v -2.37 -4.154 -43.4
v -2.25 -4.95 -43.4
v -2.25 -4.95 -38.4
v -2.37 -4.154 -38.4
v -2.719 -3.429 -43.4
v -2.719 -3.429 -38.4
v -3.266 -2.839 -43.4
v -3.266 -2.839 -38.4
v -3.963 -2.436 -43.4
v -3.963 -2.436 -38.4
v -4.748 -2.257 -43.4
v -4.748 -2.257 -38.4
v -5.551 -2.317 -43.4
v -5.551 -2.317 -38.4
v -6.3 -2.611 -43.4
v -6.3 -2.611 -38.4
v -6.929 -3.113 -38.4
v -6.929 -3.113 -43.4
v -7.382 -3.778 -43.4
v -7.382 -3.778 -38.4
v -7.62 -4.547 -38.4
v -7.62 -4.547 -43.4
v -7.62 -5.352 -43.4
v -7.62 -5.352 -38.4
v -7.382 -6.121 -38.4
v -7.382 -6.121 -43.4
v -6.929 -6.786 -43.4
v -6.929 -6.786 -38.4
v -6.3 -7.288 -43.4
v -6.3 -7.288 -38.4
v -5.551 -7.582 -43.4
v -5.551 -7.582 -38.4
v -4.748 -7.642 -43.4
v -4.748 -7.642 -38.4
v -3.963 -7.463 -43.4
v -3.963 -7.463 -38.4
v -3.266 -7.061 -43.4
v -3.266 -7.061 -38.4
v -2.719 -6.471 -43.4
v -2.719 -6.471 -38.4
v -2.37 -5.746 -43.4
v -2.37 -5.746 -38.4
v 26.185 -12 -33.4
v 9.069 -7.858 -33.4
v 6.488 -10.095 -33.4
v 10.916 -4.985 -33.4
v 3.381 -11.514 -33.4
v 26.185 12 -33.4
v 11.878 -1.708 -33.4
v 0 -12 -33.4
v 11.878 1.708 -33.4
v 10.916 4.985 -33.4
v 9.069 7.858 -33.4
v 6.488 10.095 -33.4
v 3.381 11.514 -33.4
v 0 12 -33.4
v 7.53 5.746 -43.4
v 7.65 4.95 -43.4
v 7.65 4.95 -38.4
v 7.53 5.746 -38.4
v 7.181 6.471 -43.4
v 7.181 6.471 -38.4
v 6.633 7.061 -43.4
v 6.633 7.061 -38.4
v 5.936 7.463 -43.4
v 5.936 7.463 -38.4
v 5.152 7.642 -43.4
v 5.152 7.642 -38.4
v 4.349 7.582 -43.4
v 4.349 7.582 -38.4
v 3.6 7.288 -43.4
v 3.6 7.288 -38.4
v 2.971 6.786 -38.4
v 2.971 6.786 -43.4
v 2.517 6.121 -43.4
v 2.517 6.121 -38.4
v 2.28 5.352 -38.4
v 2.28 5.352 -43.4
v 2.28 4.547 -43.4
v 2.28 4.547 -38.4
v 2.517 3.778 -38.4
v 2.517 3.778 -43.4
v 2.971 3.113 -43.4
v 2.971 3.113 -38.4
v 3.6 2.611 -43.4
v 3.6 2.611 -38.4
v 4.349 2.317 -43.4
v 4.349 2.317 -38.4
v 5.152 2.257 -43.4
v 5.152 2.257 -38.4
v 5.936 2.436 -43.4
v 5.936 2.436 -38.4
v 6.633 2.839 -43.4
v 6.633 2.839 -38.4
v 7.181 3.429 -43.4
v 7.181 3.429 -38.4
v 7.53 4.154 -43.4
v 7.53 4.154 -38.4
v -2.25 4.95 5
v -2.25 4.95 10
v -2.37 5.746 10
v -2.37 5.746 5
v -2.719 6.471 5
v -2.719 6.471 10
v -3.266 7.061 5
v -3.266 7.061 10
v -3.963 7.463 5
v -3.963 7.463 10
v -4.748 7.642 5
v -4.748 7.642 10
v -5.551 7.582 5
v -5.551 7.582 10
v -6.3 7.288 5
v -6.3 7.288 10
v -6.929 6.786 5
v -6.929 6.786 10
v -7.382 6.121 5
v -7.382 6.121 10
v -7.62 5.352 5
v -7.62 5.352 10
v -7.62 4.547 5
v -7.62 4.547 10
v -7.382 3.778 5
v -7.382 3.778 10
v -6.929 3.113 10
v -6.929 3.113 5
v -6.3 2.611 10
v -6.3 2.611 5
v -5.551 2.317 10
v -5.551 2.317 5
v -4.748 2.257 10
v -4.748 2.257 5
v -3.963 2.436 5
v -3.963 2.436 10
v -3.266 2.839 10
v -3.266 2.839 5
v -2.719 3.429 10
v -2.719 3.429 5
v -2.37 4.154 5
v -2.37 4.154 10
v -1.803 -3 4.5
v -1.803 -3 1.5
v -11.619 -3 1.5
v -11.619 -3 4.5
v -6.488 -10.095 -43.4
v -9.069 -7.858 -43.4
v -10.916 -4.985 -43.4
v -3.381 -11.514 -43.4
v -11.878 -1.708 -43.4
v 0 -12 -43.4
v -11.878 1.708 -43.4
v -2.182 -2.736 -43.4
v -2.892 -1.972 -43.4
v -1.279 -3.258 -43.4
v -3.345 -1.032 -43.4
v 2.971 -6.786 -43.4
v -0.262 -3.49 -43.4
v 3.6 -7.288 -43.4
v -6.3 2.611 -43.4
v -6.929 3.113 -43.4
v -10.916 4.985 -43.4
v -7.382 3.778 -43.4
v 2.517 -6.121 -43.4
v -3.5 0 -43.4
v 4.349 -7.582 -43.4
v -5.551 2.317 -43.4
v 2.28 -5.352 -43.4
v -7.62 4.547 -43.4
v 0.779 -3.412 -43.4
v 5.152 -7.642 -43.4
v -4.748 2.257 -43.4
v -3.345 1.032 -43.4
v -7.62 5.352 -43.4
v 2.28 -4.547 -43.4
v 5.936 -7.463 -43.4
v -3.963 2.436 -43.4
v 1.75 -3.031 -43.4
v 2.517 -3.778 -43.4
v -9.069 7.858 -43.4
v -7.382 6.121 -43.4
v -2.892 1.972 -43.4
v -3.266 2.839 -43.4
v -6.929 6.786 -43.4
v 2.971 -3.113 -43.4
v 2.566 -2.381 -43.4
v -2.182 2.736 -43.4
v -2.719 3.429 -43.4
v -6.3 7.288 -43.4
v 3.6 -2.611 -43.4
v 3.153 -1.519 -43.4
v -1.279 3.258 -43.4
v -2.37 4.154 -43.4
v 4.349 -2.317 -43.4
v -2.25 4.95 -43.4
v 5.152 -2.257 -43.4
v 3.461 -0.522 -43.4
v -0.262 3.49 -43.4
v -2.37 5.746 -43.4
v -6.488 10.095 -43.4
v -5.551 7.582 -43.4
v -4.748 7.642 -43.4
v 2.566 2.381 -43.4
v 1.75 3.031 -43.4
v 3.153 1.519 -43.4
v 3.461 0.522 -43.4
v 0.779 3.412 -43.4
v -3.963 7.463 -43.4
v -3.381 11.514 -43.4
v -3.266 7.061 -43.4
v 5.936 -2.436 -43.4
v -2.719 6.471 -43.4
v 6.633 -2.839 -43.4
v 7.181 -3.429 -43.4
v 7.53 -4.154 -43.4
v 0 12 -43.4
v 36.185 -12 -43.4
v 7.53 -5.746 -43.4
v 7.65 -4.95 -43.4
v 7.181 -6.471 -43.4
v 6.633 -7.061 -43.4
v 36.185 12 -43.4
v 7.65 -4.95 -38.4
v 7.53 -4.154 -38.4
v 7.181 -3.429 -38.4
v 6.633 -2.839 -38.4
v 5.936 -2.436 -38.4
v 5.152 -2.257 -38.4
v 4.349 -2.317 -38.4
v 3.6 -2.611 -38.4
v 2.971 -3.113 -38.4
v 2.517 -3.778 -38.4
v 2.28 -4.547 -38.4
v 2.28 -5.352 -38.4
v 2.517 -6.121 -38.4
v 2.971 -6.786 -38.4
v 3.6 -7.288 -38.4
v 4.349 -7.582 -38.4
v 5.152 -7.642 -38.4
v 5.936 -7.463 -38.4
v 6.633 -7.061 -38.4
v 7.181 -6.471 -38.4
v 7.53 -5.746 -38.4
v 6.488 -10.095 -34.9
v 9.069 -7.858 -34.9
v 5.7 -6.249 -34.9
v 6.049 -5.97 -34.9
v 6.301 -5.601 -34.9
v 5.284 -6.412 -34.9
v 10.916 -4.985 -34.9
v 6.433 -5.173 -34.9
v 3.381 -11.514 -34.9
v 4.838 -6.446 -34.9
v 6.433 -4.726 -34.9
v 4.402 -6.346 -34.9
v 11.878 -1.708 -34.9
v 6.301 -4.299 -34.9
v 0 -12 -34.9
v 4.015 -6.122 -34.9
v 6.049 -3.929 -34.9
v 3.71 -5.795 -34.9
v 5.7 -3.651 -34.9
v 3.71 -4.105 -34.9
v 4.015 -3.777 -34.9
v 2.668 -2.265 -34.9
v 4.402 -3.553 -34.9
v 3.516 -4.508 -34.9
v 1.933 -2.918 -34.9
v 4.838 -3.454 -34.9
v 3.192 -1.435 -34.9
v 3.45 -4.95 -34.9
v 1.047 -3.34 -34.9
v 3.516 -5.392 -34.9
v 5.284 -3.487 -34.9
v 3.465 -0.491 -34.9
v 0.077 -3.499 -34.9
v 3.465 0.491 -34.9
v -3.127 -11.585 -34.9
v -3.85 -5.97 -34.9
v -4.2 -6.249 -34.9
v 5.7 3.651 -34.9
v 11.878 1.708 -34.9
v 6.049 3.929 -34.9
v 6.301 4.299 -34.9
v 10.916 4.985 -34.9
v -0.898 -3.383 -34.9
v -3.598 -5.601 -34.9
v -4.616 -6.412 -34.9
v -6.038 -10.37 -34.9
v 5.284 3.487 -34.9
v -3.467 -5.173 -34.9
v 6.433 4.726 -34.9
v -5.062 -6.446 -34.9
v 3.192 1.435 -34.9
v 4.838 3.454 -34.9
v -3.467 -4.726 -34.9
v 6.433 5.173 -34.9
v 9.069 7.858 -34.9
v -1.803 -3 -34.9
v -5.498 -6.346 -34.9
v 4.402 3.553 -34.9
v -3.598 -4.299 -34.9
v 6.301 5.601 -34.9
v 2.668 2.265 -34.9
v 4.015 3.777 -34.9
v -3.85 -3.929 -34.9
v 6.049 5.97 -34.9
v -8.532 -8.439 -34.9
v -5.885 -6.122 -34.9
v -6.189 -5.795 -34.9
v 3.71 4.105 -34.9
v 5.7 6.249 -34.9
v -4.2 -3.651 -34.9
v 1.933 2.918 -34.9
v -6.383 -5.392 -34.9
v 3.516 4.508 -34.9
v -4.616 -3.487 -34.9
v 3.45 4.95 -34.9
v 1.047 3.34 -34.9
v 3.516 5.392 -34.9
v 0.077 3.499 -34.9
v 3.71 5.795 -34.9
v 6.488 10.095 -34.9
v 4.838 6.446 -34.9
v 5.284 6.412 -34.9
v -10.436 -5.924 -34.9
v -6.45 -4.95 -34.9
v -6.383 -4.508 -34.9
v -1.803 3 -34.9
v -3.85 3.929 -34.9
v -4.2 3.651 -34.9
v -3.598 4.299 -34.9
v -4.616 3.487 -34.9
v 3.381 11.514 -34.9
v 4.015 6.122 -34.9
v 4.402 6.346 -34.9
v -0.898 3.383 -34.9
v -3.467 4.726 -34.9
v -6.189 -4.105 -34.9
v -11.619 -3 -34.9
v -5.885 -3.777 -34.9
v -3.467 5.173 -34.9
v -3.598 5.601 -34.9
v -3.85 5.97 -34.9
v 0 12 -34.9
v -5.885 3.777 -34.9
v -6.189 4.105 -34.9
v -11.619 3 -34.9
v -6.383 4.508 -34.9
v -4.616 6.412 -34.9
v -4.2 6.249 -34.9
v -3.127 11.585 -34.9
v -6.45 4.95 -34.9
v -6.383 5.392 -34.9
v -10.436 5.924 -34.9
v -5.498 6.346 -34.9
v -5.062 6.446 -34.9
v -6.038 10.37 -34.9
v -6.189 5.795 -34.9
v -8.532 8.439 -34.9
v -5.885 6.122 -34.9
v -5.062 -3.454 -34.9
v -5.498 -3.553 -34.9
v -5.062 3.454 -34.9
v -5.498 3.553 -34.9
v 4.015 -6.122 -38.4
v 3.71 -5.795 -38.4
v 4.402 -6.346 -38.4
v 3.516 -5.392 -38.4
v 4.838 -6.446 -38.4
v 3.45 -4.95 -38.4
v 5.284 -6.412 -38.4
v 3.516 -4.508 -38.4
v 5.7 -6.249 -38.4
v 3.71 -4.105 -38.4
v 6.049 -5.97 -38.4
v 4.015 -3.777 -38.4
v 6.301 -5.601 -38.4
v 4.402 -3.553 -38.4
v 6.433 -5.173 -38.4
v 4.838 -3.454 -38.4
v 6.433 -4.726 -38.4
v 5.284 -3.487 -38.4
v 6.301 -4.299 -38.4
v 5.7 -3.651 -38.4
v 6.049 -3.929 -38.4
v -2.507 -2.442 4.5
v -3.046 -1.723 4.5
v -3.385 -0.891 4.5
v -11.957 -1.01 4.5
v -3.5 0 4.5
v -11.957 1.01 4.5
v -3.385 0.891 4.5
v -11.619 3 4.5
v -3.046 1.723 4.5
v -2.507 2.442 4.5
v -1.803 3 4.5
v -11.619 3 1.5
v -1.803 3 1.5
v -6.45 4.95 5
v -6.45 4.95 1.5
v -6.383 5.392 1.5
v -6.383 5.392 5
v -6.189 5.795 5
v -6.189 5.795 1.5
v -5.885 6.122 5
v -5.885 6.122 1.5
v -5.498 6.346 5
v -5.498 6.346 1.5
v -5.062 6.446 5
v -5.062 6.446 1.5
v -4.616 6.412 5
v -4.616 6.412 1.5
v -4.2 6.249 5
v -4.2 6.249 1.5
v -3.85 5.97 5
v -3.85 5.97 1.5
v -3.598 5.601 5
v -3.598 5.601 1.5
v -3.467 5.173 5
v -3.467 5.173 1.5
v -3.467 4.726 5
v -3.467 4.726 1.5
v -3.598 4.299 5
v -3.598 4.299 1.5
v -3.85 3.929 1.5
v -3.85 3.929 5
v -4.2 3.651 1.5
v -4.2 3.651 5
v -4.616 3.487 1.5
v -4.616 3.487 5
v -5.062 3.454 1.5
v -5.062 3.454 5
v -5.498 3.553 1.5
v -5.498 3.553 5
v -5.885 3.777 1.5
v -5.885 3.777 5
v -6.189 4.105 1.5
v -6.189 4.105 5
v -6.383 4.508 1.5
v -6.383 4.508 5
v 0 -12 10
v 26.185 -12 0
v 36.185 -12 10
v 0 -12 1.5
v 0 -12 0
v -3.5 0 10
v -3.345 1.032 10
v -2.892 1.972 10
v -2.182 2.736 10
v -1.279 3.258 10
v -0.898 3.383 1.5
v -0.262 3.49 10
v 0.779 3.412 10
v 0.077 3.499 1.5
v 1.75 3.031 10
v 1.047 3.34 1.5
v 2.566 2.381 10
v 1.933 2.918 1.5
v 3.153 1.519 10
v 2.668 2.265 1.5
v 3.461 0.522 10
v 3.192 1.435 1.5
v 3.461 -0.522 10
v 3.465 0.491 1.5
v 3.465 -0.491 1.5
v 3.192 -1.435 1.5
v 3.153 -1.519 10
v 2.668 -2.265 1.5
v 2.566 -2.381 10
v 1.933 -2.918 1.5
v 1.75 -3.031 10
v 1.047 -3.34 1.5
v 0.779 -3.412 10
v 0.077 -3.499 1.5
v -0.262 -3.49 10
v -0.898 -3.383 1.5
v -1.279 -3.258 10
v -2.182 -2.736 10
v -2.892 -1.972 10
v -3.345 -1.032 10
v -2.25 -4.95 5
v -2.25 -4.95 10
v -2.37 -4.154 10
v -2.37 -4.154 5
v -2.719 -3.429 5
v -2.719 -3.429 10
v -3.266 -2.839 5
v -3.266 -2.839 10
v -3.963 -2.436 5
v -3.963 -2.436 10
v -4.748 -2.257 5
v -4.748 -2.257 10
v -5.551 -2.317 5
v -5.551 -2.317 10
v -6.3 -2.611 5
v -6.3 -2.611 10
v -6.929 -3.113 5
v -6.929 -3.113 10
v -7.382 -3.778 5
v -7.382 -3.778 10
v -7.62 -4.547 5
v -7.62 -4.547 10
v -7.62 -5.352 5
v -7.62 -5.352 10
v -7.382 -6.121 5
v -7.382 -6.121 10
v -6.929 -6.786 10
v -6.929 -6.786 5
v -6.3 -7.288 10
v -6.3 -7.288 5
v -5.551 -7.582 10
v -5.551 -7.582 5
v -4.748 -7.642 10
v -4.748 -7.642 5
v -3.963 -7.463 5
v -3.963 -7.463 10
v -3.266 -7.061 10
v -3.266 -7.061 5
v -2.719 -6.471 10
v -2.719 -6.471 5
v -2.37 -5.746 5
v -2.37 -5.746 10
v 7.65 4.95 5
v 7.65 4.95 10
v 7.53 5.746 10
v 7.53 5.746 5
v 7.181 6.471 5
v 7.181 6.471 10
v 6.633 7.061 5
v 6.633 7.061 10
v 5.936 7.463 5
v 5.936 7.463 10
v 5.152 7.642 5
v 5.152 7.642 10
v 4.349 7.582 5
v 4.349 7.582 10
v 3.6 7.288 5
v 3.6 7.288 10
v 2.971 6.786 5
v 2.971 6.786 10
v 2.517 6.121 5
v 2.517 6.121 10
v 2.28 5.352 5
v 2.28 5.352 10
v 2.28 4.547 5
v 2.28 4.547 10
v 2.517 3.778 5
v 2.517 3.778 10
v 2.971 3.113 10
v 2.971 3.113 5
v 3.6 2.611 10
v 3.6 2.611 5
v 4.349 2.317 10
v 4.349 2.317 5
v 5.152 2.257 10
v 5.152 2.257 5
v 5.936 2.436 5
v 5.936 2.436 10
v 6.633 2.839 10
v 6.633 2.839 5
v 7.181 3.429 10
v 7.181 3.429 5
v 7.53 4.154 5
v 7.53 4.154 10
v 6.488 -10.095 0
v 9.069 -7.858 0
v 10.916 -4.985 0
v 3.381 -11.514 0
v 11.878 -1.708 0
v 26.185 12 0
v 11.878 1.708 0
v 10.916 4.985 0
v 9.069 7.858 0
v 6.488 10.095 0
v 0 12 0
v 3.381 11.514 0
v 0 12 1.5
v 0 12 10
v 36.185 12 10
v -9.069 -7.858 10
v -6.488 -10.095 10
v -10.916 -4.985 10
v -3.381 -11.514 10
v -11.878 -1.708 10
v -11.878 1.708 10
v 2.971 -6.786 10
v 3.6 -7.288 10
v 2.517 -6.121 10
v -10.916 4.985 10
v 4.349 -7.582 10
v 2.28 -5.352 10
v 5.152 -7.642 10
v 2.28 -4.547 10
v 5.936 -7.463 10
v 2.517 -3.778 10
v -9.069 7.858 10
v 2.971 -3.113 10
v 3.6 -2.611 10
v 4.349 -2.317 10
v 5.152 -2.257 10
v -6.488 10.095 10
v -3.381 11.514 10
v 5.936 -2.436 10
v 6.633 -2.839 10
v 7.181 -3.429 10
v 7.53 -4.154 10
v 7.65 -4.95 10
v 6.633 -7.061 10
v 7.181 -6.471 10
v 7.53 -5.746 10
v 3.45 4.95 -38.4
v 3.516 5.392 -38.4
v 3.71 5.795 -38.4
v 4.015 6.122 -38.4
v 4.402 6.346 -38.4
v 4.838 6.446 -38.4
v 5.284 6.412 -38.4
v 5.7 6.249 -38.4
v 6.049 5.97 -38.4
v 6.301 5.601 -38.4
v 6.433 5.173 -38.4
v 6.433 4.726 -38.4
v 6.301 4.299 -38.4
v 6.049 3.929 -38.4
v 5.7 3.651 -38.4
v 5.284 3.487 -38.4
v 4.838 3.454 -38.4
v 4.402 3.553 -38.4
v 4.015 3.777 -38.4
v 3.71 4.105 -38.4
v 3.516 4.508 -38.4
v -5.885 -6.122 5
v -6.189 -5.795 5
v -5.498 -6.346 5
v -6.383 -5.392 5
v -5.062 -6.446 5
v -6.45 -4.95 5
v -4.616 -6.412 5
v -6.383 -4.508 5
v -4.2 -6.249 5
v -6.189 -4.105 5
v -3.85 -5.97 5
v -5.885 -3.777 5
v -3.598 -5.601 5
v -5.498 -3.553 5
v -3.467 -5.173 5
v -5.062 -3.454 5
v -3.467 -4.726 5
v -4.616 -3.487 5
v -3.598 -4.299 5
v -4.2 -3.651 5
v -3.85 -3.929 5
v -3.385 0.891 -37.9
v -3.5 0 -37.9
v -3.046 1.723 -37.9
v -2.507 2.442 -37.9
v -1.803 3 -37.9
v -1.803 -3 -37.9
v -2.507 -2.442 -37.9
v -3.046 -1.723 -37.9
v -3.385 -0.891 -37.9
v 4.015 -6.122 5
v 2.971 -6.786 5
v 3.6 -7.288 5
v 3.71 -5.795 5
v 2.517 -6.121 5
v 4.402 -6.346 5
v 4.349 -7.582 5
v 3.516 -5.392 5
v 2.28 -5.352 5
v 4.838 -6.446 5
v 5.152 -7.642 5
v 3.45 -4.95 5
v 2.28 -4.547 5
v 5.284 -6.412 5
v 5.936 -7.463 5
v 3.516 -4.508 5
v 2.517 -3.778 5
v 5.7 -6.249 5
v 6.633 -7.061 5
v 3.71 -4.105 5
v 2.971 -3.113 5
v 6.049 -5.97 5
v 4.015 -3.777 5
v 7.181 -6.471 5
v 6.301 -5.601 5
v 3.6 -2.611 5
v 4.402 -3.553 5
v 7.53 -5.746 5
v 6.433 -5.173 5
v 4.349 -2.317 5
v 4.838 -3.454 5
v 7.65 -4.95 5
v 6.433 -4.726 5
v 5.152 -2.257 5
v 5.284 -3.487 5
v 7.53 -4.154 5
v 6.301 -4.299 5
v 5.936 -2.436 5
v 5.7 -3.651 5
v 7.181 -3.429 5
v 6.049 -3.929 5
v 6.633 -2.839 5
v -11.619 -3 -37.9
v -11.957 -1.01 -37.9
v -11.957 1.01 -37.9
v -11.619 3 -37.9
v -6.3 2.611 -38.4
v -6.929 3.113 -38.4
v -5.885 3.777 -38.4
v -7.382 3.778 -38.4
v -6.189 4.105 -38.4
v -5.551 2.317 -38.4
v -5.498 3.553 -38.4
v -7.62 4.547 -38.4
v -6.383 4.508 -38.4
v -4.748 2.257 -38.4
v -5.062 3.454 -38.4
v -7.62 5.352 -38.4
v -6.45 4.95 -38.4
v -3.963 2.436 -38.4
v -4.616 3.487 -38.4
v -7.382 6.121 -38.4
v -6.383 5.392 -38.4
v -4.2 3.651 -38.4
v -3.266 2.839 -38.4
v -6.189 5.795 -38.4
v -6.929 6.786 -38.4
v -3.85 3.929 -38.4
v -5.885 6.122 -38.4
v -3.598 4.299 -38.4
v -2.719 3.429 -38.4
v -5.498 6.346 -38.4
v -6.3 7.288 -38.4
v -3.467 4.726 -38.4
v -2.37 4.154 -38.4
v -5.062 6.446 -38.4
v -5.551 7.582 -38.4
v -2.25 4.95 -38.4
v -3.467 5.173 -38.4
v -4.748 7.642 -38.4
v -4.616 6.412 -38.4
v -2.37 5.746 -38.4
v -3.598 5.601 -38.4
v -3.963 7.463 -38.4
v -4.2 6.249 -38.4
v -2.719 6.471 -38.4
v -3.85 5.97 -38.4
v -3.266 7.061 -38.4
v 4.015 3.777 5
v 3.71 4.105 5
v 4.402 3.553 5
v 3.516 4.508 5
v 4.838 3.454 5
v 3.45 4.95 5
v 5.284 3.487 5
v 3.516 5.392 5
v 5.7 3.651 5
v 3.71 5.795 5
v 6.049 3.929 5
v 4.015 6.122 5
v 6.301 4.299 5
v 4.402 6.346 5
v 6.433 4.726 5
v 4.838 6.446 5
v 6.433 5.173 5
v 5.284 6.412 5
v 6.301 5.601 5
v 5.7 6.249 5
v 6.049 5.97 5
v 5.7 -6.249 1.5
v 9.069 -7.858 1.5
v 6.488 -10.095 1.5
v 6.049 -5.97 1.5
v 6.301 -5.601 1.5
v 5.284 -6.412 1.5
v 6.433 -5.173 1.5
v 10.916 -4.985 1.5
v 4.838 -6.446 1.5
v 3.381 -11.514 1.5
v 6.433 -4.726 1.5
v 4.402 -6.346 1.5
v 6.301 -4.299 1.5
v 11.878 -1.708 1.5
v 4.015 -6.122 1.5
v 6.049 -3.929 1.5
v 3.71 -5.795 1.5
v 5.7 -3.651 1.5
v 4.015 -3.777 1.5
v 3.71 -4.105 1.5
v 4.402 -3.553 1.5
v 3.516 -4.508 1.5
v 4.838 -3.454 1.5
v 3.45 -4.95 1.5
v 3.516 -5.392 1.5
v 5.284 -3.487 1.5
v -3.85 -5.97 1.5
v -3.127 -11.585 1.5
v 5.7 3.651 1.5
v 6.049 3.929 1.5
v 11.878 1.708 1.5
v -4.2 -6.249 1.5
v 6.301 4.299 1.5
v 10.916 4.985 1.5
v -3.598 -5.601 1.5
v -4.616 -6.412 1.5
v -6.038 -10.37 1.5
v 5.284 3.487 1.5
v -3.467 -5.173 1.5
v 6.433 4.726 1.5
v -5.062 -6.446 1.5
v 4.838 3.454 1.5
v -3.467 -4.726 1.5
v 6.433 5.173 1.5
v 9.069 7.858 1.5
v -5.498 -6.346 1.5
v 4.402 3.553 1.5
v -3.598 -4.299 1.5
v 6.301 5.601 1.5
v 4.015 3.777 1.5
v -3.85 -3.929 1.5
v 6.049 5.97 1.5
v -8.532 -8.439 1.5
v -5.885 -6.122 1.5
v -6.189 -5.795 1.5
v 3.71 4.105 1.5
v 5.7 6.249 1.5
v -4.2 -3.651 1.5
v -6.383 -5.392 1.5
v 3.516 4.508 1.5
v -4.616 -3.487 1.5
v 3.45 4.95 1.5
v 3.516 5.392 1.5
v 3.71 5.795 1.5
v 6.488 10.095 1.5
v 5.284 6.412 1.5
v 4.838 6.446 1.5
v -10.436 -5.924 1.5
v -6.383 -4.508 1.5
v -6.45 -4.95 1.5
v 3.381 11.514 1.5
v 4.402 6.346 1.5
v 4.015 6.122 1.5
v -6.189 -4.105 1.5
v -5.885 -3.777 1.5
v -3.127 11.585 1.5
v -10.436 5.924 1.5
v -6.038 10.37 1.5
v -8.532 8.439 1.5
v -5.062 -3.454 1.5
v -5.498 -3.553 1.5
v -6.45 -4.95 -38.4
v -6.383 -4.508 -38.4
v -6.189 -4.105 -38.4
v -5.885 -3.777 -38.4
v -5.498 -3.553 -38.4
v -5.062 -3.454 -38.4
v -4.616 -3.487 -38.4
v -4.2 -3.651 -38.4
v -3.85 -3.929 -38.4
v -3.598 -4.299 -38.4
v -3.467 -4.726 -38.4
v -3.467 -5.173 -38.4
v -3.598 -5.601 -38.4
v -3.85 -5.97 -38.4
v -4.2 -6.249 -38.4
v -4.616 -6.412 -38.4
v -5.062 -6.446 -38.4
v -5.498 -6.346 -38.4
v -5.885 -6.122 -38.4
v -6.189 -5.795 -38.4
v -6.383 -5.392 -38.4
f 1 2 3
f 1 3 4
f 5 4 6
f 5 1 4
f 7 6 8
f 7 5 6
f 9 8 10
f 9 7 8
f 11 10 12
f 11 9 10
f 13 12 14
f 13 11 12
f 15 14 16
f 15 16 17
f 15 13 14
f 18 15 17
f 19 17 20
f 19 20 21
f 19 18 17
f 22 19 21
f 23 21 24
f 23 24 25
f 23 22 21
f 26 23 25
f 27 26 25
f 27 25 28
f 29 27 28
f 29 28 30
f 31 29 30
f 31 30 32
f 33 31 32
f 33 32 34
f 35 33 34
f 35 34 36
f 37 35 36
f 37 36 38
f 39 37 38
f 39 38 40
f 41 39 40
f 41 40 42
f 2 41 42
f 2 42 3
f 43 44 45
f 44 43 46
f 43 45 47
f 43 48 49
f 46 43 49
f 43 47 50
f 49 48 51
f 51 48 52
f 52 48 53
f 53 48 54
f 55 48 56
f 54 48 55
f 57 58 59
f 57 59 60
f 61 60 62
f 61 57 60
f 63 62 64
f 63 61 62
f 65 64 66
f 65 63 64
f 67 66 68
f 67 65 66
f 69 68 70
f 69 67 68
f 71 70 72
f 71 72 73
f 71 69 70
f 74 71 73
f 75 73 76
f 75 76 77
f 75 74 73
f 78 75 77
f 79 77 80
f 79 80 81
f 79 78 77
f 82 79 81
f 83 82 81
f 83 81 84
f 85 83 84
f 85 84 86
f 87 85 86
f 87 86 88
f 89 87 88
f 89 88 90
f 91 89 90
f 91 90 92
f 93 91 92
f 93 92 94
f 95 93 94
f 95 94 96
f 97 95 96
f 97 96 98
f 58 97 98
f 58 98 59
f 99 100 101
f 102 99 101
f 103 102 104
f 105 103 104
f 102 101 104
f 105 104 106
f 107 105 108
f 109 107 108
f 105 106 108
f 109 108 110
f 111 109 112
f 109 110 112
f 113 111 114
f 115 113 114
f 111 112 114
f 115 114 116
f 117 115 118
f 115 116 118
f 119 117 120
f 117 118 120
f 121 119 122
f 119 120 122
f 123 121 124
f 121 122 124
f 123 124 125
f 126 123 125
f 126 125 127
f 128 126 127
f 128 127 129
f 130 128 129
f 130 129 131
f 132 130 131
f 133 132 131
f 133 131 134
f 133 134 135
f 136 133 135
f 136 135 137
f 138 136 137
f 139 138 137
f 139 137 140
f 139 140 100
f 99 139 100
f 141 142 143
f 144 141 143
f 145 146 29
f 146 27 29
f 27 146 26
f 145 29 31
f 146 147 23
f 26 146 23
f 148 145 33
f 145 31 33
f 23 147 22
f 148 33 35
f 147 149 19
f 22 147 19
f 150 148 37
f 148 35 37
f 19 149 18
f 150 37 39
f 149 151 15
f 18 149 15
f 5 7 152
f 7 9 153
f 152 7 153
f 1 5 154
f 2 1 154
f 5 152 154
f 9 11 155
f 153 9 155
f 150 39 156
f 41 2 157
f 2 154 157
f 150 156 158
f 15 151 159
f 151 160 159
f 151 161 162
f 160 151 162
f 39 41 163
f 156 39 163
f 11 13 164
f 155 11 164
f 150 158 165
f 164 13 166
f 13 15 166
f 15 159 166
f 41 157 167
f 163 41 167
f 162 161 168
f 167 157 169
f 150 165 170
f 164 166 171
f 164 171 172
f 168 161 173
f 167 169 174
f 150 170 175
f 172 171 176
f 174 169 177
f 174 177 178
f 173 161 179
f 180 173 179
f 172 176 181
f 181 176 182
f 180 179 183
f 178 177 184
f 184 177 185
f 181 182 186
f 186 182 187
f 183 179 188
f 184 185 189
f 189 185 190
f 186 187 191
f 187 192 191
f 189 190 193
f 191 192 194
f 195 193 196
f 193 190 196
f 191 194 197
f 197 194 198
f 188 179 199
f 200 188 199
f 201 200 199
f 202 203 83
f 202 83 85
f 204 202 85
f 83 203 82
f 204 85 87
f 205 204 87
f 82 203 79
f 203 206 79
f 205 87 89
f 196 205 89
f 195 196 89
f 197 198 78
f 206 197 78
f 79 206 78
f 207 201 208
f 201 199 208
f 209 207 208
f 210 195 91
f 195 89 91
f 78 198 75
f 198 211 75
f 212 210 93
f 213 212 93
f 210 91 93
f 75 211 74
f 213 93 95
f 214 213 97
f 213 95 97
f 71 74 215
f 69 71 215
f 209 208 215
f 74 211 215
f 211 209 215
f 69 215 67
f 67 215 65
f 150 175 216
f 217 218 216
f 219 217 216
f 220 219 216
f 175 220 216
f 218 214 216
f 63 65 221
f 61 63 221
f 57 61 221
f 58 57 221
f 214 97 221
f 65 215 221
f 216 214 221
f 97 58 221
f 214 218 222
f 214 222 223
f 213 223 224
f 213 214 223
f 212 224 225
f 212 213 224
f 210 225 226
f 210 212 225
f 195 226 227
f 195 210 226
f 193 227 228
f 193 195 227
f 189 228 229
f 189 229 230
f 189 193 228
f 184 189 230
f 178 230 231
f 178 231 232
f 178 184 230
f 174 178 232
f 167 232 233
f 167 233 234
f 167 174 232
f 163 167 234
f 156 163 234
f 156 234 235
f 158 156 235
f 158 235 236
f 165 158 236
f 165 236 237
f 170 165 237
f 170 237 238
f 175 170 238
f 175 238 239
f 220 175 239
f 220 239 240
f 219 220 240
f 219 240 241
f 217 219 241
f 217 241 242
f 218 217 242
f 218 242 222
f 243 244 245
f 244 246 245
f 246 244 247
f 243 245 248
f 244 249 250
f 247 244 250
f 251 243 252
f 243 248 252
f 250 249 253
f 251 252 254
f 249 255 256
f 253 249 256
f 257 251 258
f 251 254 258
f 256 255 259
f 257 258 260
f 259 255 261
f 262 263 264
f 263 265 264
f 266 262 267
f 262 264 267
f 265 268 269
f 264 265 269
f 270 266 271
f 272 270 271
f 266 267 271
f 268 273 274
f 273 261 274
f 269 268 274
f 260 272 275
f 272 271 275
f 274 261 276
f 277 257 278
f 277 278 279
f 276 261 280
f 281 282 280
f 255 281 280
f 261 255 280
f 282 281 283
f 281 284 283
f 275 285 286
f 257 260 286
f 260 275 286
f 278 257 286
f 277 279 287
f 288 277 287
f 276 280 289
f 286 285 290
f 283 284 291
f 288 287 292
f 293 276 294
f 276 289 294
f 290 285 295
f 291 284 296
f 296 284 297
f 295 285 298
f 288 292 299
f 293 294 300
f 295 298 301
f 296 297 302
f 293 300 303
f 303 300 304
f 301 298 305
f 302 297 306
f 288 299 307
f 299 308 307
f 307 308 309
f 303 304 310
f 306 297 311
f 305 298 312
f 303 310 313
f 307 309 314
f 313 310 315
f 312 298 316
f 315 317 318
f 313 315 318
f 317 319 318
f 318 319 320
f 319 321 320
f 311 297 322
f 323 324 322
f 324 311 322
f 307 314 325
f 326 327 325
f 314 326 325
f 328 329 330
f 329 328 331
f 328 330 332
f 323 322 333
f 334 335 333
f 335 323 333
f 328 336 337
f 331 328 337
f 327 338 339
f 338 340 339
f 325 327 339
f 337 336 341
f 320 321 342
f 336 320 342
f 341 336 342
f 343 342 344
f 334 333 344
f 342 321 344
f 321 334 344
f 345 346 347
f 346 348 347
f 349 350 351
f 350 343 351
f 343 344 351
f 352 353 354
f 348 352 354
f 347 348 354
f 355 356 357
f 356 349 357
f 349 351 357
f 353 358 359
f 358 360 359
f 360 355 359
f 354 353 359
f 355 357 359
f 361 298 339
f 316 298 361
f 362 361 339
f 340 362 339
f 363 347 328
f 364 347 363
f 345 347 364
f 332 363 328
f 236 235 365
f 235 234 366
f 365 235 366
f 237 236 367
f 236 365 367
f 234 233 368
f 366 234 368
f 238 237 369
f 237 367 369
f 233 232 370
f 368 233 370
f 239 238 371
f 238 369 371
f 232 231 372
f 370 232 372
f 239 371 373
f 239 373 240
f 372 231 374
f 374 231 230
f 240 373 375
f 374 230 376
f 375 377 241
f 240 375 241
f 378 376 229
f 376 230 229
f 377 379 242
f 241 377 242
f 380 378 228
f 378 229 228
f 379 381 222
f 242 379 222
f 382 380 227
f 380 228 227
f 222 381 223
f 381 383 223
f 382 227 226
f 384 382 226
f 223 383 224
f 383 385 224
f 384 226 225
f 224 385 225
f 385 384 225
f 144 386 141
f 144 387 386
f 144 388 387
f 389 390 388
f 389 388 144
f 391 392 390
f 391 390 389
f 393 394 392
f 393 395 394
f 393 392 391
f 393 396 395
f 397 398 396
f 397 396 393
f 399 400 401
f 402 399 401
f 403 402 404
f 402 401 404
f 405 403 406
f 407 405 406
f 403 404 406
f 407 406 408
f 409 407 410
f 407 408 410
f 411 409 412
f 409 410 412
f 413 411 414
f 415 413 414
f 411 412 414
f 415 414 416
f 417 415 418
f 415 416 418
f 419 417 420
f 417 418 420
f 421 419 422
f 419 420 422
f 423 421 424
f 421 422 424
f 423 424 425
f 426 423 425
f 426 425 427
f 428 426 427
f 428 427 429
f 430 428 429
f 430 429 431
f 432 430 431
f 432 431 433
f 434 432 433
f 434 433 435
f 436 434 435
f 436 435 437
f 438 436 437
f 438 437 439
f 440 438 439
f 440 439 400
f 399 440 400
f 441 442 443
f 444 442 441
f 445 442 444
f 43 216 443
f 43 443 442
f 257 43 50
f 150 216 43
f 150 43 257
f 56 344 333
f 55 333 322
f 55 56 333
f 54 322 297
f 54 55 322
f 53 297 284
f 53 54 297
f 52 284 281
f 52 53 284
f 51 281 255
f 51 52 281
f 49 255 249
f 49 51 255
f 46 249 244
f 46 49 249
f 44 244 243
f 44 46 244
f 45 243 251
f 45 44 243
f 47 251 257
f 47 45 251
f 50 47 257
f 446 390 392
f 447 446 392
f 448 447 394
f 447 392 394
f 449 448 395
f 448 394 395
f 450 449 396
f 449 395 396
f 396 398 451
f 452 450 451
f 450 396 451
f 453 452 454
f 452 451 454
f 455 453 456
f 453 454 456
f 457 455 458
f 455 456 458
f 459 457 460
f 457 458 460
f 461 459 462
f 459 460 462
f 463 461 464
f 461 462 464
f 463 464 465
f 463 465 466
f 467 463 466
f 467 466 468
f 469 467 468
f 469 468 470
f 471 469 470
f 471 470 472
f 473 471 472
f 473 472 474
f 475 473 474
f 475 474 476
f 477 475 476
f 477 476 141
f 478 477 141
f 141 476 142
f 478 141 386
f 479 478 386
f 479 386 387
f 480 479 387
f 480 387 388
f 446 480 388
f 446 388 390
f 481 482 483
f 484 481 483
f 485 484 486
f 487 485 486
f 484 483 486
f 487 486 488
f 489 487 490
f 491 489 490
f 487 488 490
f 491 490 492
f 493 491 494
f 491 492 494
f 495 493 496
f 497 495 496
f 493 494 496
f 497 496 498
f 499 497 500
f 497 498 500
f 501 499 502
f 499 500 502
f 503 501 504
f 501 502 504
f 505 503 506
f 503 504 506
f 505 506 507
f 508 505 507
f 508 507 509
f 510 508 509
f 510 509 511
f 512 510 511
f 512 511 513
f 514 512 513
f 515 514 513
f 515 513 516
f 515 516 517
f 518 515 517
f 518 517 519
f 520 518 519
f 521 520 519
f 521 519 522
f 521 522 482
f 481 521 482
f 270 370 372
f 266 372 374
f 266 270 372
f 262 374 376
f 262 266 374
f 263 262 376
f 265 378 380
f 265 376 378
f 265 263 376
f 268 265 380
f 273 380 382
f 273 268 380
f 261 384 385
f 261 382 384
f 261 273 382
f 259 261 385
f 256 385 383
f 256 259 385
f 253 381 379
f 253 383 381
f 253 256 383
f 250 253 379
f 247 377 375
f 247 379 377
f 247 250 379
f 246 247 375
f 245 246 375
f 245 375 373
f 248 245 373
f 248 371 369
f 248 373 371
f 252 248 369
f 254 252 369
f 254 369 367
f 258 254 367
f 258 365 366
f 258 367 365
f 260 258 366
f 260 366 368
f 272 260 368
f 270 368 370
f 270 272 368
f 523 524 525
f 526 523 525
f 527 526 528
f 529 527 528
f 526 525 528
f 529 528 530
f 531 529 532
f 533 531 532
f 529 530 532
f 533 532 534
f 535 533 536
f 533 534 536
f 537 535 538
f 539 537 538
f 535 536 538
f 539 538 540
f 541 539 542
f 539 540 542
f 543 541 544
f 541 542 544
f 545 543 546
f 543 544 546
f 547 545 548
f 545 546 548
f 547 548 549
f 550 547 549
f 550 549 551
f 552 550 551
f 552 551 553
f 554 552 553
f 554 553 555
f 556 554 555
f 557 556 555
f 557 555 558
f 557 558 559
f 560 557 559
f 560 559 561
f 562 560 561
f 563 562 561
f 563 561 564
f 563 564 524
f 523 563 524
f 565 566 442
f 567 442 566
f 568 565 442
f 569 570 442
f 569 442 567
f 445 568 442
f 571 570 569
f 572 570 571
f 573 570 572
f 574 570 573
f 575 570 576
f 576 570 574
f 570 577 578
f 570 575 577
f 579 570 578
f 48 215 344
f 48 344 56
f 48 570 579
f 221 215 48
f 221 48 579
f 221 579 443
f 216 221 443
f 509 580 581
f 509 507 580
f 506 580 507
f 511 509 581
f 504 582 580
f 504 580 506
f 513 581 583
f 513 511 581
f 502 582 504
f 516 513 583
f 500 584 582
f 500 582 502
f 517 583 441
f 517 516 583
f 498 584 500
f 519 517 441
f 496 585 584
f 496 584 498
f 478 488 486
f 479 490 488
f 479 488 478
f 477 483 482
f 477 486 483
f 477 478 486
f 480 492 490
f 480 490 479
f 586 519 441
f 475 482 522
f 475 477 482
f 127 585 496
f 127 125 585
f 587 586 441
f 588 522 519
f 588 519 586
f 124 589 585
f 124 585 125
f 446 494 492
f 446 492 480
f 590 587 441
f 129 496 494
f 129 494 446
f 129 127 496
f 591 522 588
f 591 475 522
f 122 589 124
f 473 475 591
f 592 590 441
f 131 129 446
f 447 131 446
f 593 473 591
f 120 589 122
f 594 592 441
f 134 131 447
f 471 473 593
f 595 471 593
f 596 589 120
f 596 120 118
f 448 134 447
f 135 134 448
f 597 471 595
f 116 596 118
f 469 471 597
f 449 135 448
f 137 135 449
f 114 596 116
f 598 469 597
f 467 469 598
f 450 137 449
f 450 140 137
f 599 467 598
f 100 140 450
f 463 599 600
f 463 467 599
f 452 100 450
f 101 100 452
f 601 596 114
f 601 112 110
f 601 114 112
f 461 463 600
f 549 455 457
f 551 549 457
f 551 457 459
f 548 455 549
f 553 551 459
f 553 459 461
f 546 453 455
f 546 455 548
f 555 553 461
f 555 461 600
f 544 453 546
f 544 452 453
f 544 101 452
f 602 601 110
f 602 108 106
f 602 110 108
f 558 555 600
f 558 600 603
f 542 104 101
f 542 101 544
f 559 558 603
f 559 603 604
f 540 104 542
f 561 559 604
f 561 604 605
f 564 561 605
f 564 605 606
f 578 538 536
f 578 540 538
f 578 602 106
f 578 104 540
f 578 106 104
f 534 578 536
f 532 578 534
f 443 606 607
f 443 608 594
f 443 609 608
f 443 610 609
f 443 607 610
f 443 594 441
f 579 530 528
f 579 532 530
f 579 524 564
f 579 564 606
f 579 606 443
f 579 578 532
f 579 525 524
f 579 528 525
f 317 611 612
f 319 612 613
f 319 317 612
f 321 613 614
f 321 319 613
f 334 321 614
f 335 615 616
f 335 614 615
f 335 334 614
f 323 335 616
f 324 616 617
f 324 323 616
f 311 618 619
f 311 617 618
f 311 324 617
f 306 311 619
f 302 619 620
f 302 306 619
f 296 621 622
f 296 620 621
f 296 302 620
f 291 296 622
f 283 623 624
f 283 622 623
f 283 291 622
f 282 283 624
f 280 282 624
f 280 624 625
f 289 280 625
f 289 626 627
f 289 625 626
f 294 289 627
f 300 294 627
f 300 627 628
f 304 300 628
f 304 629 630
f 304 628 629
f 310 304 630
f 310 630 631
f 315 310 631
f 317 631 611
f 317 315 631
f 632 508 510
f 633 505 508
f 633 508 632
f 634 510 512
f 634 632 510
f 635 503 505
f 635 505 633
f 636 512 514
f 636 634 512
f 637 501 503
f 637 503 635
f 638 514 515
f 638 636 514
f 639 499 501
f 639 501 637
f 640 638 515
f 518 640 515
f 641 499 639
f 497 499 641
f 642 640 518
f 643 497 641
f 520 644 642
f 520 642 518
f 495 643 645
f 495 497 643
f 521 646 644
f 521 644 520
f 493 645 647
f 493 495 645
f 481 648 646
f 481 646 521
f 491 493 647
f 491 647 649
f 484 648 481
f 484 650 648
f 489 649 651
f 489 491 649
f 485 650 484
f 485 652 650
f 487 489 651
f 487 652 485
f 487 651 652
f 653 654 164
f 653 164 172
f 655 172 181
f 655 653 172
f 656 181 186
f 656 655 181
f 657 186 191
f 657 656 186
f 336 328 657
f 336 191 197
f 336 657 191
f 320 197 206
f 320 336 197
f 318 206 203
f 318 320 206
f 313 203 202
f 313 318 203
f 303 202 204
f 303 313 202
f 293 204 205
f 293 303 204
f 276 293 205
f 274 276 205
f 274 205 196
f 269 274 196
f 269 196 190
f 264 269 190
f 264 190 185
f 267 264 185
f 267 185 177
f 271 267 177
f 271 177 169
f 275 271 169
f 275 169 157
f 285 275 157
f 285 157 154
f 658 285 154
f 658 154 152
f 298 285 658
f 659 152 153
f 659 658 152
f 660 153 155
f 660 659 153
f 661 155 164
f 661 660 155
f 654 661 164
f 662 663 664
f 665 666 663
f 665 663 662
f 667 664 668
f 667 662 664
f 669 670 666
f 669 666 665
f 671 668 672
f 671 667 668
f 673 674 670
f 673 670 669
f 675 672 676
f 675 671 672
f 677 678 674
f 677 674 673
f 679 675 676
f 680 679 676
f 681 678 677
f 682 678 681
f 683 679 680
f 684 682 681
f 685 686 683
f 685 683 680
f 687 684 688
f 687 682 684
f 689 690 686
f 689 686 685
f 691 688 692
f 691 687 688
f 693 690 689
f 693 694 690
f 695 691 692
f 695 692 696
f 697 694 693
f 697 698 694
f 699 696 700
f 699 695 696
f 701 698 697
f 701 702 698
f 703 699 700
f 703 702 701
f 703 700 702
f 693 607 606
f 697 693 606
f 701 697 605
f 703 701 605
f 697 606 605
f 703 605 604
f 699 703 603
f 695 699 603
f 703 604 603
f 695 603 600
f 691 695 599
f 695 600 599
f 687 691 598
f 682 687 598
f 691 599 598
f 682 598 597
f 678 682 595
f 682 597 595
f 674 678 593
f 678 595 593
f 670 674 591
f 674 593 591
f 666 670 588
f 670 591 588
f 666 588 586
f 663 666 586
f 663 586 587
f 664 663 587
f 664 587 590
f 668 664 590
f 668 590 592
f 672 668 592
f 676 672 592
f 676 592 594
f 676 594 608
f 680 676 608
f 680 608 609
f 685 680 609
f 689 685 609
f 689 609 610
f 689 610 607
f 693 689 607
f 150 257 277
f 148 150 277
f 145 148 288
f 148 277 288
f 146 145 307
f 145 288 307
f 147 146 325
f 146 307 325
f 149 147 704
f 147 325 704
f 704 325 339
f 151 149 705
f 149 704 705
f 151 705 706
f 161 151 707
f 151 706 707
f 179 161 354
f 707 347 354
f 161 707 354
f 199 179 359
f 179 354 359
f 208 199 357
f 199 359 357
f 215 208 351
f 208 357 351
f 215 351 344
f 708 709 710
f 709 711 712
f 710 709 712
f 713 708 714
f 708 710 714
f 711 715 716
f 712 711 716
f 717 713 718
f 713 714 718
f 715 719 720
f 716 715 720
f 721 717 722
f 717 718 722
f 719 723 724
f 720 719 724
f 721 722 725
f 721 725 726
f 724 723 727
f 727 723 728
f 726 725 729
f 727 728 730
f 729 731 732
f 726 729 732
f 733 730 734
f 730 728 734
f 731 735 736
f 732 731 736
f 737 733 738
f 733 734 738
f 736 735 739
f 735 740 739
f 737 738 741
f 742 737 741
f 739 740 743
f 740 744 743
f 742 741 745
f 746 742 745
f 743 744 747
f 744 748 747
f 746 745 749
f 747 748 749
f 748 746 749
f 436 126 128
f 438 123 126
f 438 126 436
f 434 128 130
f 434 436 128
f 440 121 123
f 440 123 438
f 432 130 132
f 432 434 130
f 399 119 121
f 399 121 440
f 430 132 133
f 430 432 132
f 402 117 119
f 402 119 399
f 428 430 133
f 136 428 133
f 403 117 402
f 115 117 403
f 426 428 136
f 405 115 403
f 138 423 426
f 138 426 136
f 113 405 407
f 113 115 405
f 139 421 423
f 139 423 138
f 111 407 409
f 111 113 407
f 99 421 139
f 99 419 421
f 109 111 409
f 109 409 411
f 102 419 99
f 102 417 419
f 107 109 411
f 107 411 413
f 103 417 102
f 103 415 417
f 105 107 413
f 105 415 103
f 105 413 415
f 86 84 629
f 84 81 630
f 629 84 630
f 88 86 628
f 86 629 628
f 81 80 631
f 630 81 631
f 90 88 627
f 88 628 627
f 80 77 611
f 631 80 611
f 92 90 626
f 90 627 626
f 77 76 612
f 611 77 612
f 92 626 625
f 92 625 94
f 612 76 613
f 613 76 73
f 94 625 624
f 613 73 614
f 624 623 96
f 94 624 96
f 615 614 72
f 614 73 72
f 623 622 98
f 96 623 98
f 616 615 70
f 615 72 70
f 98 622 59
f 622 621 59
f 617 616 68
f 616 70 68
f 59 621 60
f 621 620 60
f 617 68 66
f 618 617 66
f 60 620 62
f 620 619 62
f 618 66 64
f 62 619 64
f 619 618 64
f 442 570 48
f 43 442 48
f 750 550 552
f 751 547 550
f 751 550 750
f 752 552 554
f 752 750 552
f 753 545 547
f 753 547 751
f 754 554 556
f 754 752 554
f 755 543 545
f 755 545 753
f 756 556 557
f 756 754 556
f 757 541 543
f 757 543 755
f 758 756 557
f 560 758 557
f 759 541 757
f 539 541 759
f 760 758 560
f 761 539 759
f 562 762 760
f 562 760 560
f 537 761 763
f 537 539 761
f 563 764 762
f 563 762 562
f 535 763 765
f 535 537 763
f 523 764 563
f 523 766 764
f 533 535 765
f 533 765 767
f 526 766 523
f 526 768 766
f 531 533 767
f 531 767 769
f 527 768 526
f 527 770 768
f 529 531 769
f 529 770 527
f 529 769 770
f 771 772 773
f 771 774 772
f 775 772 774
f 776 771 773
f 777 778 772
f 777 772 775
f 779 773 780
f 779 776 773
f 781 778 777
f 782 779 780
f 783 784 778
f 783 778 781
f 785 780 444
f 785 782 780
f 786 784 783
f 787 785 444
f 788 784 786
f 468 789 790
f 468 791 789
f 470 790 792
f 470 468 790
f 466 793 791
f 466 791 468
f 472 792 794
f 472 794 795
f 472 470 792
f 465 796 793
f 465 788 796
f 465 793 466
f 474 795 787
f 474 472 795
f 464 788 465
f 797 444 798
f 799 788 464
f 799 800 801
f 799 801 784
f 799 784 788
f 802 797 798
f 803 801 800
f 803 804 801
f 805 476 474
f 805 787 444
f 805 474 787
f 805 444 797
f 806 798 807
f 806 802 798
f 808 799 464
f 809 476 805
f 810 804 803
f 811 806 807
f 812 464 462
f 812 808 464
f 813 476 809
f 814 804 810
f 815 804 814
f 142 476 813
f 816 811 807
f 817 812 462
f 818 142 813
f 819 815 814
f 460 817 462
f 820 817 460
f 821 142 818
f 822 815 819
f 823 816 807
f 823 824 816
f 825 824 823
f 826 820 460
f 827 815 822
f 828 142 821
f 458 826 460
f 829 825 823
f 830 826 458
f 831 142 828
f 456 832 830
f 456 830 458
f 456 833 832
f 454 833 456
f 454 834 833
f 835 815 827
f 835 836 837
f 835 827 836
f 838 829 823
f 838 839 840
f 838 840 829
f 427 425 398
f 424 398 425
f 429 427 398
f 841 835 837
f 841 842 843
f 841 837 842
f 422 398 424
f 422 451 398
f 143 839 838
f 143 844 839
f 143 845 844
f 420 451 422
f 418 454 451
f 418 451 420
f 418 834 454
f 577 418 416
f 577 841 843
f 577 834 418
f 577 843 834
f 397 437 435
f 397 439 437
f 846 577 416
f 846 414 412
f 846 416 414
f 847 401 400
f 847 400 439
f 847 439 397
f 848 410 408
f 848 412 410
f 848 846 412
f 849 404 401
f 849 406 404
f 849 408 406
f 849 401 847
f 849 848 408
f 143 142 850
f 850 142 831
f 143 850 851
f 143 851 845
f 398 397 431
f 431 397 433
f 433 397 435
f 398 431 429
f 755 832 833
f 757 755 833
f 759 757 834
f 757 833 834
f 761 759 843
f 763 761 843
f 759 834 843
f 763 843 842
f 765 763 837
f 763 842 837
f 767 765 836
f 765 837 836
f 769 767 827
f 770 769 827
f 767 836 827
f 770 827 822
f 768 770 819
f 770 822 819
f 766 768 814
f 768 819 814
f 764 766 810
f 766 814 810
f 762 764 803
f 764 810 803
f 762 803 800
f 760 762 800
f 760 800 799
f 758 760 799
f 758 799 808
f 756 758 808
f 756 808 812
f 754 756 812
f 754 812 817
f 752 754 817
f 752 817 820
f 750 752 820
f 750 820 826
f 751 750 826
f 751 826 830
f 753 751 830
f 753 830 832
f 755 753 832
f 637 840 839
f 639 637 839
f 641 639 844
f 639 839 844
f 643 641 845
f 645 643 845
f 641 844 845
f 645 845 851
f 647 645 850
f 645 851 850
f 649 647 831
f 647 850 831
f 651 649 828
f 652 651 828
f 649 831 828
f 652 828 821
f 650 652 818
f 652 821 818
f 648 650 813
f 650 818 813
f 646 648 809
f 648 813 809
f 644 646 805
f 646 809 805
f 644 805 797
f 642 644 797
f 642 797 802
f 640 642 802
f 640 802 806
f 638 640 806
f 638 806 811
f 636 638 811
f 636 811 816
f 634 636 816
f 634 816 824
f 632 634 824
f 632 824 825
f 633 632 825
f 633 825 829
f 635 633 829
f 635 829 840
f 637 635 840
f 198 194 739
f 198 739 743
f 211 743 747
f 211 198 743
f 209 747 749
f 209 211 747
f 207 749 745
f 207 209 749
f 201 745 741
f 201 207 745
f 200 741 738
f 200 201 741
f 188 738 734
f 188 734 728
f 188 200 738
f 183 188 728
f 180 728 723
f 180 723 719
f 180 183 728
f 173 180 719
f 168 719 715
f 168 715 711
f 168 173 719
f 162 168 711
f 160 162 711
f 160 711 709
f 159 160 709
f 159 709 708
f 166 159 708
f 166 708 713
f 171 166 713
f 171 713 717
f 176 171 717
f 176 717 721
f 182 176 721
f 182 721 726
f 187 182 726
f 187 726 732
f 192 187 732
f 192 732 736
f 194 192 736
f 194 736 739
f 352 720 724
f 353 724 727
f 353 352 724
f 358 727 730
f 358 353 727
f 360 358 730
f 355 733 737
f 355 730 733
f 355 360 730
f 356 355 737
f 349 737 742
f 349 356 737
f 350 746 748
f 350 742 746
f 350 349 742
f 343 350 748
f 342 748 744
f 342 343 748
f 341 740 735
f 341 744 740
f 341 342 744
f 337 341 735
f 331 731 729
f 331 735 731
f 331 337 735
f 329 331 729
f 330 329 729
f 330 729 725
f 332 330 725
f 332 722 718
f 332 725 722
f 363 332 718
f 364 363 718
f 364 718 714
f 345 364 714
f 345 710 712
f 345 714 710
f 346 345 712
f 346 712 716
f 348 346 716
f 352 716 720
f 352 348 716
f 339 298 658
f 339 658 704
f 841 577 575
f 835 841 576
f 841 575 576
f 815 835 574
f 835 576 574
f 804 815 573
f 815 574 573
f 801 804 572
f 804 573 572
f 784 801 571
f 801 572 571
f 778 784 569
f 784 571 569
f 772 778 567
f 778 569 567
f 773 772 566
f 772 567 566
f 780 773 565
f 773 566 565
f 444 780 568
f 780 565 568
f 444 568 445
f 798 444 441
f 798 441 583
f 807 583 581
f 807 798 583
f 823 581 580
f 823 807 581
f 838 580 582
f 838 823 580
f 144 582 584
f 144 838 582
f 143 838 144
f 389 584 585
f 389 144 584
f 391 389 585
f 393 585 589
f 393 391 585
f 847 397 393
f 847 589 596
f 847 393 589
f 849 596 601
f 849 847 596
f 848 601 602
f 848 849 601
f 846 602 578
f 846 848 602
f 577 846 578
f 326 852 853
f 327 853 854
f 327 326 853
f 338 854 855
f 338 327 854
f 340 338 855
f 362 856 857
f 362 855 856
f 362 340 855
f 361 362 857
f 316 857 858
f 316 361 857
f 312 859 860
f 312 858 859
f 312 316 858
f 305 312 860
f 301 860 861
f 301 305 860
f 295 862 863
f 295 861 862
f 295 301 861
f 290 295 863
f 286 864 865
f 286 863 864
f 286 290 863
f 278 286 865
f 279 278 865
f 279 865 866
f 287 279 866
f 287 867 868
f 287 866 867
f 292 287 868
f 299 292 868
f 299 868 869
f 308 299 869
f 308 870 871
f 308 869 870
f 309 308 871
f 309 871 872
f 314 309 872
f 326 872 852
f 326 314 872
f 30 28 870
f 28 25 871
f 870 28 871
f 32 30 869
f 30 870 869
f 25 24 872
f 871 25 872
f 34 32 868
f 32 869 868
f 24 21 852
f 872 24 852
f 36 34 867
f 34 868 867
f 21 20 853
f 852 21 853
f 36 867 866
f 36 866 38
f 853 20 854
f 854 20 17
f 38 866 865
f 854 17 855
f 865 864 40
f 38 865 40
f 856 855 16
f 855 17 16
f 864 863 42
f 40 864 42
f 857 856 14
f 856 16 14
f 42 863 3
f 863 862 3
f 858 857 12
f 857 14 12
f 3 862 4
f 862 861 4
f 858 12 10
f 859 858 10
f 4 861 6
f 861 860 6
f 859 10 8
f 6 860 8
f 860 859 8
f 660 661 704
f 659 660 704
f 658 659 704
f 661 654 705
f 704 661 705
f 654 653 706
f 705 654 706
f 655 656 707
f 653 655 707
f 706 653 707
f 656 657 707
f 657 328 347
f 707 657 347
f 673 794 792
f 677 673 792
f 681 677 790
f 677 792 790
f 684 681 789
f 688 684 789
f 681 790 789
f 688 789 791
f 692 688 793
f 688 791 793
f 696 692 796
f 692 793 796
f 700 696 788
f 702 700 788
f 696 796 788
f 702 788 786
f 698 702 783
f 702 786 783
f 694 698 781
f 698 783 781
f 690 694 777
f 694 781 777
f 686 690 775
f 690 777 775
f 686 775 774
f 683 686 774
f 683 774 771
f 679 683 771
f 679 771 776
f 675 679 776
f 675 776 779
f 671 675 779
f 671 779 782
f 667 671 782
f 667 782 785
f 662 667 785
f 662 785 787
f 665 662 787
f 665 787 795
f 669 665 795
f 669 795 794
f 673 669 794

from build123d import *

# Parameters (mm, degrees)
EXTRUDE_1_DEPTH      = 13.5
SKETCH_5_R           = 10.1
CUT_EXTRUDE_2_DEPTH  = 1.5
SKETCH_7_R           = 3.5
CUT_EXTRUDE_3_DEPTH  = 37
SKETCH_9_R           = 1.5
CUT_EXTRUDE_4_DEPTH  = 24.5
SKETCH_11_W          = 60.4
SKETCH_11_H          = 24
EXTRUDE_2_DEPTH      = 10
SKETCH_12_R          = 2.7
CUT_EXTRUDE_5_DEPTH  = 8.5
SKETCH_18_R          = 12
CUT_EXTRUDE_9_DEPTH  = 1.5
SKETCH_19_W          = 14.67242397
SKETCH_19_H          = 6
CUT_EXTRUDE_10_DEPTH = 3
SKETCH_20_W          = 76.507524202
SKETCH_20_H          = 37.102074034
CUT_EXTRUDE_11_DEPTH = 3.5


with BuildPart() as part:
    # 草图1 → 凸台-拉伸1 (new body)
    with BuildSketch(Plane.XY):
        with BuildLine():
            Line((0, 12), (36.185307738, 12))
            Line((36.185307738, 12), (36.185307738, -12))
            Line((36.185307738, -12), (0, -12))
            ThreePointArc((0, -12), (-12, 0), (0, 12))
        make_face()
    extrude(amount=EXTRUDE_1_DEPTH)

    # 草图5 → 切除-拉伸2 (cut)
    with BuildSketch(Plane(origin=(0, 0, 0), x_dir=(-1, 0, 0), z_dir=(0, 0, -1))):
        Circle(SKETCH_5_R)
    extrude(amount=-CUT_EXTRUDE_2_DEPTH, mode=Mode.SUBTRACT)

    # 草图7 → 切除-拉伸3 (cut)
    with BuildSketch(Plane(origin=(0, 0, 1.5), x_dir=(-1, 0, 0), z_dir=(0, 0, -1))):
        Circle(SKETCH_7_R)
    extrude(amount=-CUT_EXTRUDE_3_DEPTH, mode=Mode.SUBTRACT)

    # 草图9 → 切除-拉伸4 (cut)
    with BuildSketch(Plane(origin=(0, 0, 1.5), x_dir=(-1, 0, 0), z_dir=(0, 0, -1))):
        with Locations((-4.949747468, 4.949747468)):
            Circle(SKETCH_9_R)
        with Locations((4.949747468, 4.949747468)):
            Circle(SKETCH_9_R)
        with Locations((4.949747468, -4.949747468)):
            Circle(SKETCH_9_R)
        with Locations((-4.949747468, -4.949747468)):
            Circle(SKETCH_9_R)
    extrude(amount=-CUT_EXTRUDE_4_DEPTH, mode=Mode.SUBTRACT)


with BuildPart() as body_2:
    # 镜向14: mirrored copy
    add(part.part.mirror(Plane(origin=(0, 0, -16.7), x_dir=(1, 0, 0), z_dir=(0, 0, -1))))


with BuildPart() as part_1:
    add(part.part)

    add(body_2.part)  # 凸台-拉伸2 merges body 2
    # 草图11 → 凸台-拉伸2 (add)
    with BuildSketch(Plane(origin=(36.185307738, 0, 0), x_dir=(0, 0, -1), z_dir=(1, 0, 0))):
        with Locations((16.7, 0)):
            Rectangle(SKETCH_11_W, SKETCH_11_H)
    extrude(amount=-EXTRUDE_2_DEPTH)

    # 草图12 → 切除-拉伸5 (cut)
    with BuildSketch(Plane.XY.offset(13.5)):
        with Locations((4.949747468, 4.949747468)):
            Circle(SKETCH_12_R)
        with Locations((4.949747468, -4.949747468)):
            Circle(SKETCH_12_R)
        with Locations((-4.949747468, -4.949747468)):
            Circle(SKETCH_12_R)
        with Locations((-4.949747468, 4.949747468)):
            Circle(SKETCH_12_R)
    cut_extrude_5 = extrude(amount=-CUT_EXTRUDE_5_DEPTH, mode=Mode.SUBTRACT)

    # 草图18 → 切除-拉伸9 (cut)
    with BuildSketch(Plane(origin=(0, 0, 0), x_dir=(-1, 0, 0), z_dir=(0, 0, -1))):
        Circle(SKETCH_18_R)
    cut_extrude_9 = extrude(amount=-CUT_EXTRUDE_9_DEPTH, mode=Mode.SUBTRACT)

    # 草图19 → 切除-拉伸10 (cut)
    with BuildSketch(Plane(origin=(0, 0, 1.5), x_dir=(-1, 0, 0), z_dir=(0, 0, -1))):
        with Locations((7.336211985, 0)):
            Rectangle(SKETCH_19_W, SKETCH_19_H)
    cut_extrude_10 = extrude(amount=-CUT_EXTRUDE_10_DEPTH, mode=Mode.SUBTRACT)

    # 草图20 → 切除-拉伸11 (cut)
    with BuildSketch(Plane.XY.offset(13.5)):
        with Locations((20.283666709, 0.248055891)):
            Rectangle(SKETCH_20_W, SKETCH_20_H)
    cut_extrude_11 = extrude(amount=-CUT_EXTRUDE_11_DEPTH, mode=Mode.SUBTRACT)

    # 镜向24: 切除-拉伸5, 切除-拉伸9, 切除-拉伸10 across plane
    add(cut_extrude_5.mirror(Plane(origin=(0, 0, -16.7), x_dir=(1, 0, 0), z_dir=(0, 0, -1))), mode=Mode.SUBTRACT)
    add(cut_extrude_9.mirror(Plane(origin=(0, 0, -16.7), x_dir=(1, 0, 0), z_dir=(0, 0, -1))), mode=Mode.SUBTRACT)
    add(cut_extrude_10.mirror(Plane(origin=(0, 0, -16.7), x_dir=(1, 0, 0), z_dir=(0, 0, -1))), mode=Mode.SUBTRACT)

    # 镜向26: 切除-拉伸11 across plane
    add(cut_extrude_11.mirror(Plane(origin=(0, 0, -16.7), x_dir=(1, 0, 0), z_dir=(0, 0, -1))), mode=Mode.SUBTRACT)


solid = part_1.part
